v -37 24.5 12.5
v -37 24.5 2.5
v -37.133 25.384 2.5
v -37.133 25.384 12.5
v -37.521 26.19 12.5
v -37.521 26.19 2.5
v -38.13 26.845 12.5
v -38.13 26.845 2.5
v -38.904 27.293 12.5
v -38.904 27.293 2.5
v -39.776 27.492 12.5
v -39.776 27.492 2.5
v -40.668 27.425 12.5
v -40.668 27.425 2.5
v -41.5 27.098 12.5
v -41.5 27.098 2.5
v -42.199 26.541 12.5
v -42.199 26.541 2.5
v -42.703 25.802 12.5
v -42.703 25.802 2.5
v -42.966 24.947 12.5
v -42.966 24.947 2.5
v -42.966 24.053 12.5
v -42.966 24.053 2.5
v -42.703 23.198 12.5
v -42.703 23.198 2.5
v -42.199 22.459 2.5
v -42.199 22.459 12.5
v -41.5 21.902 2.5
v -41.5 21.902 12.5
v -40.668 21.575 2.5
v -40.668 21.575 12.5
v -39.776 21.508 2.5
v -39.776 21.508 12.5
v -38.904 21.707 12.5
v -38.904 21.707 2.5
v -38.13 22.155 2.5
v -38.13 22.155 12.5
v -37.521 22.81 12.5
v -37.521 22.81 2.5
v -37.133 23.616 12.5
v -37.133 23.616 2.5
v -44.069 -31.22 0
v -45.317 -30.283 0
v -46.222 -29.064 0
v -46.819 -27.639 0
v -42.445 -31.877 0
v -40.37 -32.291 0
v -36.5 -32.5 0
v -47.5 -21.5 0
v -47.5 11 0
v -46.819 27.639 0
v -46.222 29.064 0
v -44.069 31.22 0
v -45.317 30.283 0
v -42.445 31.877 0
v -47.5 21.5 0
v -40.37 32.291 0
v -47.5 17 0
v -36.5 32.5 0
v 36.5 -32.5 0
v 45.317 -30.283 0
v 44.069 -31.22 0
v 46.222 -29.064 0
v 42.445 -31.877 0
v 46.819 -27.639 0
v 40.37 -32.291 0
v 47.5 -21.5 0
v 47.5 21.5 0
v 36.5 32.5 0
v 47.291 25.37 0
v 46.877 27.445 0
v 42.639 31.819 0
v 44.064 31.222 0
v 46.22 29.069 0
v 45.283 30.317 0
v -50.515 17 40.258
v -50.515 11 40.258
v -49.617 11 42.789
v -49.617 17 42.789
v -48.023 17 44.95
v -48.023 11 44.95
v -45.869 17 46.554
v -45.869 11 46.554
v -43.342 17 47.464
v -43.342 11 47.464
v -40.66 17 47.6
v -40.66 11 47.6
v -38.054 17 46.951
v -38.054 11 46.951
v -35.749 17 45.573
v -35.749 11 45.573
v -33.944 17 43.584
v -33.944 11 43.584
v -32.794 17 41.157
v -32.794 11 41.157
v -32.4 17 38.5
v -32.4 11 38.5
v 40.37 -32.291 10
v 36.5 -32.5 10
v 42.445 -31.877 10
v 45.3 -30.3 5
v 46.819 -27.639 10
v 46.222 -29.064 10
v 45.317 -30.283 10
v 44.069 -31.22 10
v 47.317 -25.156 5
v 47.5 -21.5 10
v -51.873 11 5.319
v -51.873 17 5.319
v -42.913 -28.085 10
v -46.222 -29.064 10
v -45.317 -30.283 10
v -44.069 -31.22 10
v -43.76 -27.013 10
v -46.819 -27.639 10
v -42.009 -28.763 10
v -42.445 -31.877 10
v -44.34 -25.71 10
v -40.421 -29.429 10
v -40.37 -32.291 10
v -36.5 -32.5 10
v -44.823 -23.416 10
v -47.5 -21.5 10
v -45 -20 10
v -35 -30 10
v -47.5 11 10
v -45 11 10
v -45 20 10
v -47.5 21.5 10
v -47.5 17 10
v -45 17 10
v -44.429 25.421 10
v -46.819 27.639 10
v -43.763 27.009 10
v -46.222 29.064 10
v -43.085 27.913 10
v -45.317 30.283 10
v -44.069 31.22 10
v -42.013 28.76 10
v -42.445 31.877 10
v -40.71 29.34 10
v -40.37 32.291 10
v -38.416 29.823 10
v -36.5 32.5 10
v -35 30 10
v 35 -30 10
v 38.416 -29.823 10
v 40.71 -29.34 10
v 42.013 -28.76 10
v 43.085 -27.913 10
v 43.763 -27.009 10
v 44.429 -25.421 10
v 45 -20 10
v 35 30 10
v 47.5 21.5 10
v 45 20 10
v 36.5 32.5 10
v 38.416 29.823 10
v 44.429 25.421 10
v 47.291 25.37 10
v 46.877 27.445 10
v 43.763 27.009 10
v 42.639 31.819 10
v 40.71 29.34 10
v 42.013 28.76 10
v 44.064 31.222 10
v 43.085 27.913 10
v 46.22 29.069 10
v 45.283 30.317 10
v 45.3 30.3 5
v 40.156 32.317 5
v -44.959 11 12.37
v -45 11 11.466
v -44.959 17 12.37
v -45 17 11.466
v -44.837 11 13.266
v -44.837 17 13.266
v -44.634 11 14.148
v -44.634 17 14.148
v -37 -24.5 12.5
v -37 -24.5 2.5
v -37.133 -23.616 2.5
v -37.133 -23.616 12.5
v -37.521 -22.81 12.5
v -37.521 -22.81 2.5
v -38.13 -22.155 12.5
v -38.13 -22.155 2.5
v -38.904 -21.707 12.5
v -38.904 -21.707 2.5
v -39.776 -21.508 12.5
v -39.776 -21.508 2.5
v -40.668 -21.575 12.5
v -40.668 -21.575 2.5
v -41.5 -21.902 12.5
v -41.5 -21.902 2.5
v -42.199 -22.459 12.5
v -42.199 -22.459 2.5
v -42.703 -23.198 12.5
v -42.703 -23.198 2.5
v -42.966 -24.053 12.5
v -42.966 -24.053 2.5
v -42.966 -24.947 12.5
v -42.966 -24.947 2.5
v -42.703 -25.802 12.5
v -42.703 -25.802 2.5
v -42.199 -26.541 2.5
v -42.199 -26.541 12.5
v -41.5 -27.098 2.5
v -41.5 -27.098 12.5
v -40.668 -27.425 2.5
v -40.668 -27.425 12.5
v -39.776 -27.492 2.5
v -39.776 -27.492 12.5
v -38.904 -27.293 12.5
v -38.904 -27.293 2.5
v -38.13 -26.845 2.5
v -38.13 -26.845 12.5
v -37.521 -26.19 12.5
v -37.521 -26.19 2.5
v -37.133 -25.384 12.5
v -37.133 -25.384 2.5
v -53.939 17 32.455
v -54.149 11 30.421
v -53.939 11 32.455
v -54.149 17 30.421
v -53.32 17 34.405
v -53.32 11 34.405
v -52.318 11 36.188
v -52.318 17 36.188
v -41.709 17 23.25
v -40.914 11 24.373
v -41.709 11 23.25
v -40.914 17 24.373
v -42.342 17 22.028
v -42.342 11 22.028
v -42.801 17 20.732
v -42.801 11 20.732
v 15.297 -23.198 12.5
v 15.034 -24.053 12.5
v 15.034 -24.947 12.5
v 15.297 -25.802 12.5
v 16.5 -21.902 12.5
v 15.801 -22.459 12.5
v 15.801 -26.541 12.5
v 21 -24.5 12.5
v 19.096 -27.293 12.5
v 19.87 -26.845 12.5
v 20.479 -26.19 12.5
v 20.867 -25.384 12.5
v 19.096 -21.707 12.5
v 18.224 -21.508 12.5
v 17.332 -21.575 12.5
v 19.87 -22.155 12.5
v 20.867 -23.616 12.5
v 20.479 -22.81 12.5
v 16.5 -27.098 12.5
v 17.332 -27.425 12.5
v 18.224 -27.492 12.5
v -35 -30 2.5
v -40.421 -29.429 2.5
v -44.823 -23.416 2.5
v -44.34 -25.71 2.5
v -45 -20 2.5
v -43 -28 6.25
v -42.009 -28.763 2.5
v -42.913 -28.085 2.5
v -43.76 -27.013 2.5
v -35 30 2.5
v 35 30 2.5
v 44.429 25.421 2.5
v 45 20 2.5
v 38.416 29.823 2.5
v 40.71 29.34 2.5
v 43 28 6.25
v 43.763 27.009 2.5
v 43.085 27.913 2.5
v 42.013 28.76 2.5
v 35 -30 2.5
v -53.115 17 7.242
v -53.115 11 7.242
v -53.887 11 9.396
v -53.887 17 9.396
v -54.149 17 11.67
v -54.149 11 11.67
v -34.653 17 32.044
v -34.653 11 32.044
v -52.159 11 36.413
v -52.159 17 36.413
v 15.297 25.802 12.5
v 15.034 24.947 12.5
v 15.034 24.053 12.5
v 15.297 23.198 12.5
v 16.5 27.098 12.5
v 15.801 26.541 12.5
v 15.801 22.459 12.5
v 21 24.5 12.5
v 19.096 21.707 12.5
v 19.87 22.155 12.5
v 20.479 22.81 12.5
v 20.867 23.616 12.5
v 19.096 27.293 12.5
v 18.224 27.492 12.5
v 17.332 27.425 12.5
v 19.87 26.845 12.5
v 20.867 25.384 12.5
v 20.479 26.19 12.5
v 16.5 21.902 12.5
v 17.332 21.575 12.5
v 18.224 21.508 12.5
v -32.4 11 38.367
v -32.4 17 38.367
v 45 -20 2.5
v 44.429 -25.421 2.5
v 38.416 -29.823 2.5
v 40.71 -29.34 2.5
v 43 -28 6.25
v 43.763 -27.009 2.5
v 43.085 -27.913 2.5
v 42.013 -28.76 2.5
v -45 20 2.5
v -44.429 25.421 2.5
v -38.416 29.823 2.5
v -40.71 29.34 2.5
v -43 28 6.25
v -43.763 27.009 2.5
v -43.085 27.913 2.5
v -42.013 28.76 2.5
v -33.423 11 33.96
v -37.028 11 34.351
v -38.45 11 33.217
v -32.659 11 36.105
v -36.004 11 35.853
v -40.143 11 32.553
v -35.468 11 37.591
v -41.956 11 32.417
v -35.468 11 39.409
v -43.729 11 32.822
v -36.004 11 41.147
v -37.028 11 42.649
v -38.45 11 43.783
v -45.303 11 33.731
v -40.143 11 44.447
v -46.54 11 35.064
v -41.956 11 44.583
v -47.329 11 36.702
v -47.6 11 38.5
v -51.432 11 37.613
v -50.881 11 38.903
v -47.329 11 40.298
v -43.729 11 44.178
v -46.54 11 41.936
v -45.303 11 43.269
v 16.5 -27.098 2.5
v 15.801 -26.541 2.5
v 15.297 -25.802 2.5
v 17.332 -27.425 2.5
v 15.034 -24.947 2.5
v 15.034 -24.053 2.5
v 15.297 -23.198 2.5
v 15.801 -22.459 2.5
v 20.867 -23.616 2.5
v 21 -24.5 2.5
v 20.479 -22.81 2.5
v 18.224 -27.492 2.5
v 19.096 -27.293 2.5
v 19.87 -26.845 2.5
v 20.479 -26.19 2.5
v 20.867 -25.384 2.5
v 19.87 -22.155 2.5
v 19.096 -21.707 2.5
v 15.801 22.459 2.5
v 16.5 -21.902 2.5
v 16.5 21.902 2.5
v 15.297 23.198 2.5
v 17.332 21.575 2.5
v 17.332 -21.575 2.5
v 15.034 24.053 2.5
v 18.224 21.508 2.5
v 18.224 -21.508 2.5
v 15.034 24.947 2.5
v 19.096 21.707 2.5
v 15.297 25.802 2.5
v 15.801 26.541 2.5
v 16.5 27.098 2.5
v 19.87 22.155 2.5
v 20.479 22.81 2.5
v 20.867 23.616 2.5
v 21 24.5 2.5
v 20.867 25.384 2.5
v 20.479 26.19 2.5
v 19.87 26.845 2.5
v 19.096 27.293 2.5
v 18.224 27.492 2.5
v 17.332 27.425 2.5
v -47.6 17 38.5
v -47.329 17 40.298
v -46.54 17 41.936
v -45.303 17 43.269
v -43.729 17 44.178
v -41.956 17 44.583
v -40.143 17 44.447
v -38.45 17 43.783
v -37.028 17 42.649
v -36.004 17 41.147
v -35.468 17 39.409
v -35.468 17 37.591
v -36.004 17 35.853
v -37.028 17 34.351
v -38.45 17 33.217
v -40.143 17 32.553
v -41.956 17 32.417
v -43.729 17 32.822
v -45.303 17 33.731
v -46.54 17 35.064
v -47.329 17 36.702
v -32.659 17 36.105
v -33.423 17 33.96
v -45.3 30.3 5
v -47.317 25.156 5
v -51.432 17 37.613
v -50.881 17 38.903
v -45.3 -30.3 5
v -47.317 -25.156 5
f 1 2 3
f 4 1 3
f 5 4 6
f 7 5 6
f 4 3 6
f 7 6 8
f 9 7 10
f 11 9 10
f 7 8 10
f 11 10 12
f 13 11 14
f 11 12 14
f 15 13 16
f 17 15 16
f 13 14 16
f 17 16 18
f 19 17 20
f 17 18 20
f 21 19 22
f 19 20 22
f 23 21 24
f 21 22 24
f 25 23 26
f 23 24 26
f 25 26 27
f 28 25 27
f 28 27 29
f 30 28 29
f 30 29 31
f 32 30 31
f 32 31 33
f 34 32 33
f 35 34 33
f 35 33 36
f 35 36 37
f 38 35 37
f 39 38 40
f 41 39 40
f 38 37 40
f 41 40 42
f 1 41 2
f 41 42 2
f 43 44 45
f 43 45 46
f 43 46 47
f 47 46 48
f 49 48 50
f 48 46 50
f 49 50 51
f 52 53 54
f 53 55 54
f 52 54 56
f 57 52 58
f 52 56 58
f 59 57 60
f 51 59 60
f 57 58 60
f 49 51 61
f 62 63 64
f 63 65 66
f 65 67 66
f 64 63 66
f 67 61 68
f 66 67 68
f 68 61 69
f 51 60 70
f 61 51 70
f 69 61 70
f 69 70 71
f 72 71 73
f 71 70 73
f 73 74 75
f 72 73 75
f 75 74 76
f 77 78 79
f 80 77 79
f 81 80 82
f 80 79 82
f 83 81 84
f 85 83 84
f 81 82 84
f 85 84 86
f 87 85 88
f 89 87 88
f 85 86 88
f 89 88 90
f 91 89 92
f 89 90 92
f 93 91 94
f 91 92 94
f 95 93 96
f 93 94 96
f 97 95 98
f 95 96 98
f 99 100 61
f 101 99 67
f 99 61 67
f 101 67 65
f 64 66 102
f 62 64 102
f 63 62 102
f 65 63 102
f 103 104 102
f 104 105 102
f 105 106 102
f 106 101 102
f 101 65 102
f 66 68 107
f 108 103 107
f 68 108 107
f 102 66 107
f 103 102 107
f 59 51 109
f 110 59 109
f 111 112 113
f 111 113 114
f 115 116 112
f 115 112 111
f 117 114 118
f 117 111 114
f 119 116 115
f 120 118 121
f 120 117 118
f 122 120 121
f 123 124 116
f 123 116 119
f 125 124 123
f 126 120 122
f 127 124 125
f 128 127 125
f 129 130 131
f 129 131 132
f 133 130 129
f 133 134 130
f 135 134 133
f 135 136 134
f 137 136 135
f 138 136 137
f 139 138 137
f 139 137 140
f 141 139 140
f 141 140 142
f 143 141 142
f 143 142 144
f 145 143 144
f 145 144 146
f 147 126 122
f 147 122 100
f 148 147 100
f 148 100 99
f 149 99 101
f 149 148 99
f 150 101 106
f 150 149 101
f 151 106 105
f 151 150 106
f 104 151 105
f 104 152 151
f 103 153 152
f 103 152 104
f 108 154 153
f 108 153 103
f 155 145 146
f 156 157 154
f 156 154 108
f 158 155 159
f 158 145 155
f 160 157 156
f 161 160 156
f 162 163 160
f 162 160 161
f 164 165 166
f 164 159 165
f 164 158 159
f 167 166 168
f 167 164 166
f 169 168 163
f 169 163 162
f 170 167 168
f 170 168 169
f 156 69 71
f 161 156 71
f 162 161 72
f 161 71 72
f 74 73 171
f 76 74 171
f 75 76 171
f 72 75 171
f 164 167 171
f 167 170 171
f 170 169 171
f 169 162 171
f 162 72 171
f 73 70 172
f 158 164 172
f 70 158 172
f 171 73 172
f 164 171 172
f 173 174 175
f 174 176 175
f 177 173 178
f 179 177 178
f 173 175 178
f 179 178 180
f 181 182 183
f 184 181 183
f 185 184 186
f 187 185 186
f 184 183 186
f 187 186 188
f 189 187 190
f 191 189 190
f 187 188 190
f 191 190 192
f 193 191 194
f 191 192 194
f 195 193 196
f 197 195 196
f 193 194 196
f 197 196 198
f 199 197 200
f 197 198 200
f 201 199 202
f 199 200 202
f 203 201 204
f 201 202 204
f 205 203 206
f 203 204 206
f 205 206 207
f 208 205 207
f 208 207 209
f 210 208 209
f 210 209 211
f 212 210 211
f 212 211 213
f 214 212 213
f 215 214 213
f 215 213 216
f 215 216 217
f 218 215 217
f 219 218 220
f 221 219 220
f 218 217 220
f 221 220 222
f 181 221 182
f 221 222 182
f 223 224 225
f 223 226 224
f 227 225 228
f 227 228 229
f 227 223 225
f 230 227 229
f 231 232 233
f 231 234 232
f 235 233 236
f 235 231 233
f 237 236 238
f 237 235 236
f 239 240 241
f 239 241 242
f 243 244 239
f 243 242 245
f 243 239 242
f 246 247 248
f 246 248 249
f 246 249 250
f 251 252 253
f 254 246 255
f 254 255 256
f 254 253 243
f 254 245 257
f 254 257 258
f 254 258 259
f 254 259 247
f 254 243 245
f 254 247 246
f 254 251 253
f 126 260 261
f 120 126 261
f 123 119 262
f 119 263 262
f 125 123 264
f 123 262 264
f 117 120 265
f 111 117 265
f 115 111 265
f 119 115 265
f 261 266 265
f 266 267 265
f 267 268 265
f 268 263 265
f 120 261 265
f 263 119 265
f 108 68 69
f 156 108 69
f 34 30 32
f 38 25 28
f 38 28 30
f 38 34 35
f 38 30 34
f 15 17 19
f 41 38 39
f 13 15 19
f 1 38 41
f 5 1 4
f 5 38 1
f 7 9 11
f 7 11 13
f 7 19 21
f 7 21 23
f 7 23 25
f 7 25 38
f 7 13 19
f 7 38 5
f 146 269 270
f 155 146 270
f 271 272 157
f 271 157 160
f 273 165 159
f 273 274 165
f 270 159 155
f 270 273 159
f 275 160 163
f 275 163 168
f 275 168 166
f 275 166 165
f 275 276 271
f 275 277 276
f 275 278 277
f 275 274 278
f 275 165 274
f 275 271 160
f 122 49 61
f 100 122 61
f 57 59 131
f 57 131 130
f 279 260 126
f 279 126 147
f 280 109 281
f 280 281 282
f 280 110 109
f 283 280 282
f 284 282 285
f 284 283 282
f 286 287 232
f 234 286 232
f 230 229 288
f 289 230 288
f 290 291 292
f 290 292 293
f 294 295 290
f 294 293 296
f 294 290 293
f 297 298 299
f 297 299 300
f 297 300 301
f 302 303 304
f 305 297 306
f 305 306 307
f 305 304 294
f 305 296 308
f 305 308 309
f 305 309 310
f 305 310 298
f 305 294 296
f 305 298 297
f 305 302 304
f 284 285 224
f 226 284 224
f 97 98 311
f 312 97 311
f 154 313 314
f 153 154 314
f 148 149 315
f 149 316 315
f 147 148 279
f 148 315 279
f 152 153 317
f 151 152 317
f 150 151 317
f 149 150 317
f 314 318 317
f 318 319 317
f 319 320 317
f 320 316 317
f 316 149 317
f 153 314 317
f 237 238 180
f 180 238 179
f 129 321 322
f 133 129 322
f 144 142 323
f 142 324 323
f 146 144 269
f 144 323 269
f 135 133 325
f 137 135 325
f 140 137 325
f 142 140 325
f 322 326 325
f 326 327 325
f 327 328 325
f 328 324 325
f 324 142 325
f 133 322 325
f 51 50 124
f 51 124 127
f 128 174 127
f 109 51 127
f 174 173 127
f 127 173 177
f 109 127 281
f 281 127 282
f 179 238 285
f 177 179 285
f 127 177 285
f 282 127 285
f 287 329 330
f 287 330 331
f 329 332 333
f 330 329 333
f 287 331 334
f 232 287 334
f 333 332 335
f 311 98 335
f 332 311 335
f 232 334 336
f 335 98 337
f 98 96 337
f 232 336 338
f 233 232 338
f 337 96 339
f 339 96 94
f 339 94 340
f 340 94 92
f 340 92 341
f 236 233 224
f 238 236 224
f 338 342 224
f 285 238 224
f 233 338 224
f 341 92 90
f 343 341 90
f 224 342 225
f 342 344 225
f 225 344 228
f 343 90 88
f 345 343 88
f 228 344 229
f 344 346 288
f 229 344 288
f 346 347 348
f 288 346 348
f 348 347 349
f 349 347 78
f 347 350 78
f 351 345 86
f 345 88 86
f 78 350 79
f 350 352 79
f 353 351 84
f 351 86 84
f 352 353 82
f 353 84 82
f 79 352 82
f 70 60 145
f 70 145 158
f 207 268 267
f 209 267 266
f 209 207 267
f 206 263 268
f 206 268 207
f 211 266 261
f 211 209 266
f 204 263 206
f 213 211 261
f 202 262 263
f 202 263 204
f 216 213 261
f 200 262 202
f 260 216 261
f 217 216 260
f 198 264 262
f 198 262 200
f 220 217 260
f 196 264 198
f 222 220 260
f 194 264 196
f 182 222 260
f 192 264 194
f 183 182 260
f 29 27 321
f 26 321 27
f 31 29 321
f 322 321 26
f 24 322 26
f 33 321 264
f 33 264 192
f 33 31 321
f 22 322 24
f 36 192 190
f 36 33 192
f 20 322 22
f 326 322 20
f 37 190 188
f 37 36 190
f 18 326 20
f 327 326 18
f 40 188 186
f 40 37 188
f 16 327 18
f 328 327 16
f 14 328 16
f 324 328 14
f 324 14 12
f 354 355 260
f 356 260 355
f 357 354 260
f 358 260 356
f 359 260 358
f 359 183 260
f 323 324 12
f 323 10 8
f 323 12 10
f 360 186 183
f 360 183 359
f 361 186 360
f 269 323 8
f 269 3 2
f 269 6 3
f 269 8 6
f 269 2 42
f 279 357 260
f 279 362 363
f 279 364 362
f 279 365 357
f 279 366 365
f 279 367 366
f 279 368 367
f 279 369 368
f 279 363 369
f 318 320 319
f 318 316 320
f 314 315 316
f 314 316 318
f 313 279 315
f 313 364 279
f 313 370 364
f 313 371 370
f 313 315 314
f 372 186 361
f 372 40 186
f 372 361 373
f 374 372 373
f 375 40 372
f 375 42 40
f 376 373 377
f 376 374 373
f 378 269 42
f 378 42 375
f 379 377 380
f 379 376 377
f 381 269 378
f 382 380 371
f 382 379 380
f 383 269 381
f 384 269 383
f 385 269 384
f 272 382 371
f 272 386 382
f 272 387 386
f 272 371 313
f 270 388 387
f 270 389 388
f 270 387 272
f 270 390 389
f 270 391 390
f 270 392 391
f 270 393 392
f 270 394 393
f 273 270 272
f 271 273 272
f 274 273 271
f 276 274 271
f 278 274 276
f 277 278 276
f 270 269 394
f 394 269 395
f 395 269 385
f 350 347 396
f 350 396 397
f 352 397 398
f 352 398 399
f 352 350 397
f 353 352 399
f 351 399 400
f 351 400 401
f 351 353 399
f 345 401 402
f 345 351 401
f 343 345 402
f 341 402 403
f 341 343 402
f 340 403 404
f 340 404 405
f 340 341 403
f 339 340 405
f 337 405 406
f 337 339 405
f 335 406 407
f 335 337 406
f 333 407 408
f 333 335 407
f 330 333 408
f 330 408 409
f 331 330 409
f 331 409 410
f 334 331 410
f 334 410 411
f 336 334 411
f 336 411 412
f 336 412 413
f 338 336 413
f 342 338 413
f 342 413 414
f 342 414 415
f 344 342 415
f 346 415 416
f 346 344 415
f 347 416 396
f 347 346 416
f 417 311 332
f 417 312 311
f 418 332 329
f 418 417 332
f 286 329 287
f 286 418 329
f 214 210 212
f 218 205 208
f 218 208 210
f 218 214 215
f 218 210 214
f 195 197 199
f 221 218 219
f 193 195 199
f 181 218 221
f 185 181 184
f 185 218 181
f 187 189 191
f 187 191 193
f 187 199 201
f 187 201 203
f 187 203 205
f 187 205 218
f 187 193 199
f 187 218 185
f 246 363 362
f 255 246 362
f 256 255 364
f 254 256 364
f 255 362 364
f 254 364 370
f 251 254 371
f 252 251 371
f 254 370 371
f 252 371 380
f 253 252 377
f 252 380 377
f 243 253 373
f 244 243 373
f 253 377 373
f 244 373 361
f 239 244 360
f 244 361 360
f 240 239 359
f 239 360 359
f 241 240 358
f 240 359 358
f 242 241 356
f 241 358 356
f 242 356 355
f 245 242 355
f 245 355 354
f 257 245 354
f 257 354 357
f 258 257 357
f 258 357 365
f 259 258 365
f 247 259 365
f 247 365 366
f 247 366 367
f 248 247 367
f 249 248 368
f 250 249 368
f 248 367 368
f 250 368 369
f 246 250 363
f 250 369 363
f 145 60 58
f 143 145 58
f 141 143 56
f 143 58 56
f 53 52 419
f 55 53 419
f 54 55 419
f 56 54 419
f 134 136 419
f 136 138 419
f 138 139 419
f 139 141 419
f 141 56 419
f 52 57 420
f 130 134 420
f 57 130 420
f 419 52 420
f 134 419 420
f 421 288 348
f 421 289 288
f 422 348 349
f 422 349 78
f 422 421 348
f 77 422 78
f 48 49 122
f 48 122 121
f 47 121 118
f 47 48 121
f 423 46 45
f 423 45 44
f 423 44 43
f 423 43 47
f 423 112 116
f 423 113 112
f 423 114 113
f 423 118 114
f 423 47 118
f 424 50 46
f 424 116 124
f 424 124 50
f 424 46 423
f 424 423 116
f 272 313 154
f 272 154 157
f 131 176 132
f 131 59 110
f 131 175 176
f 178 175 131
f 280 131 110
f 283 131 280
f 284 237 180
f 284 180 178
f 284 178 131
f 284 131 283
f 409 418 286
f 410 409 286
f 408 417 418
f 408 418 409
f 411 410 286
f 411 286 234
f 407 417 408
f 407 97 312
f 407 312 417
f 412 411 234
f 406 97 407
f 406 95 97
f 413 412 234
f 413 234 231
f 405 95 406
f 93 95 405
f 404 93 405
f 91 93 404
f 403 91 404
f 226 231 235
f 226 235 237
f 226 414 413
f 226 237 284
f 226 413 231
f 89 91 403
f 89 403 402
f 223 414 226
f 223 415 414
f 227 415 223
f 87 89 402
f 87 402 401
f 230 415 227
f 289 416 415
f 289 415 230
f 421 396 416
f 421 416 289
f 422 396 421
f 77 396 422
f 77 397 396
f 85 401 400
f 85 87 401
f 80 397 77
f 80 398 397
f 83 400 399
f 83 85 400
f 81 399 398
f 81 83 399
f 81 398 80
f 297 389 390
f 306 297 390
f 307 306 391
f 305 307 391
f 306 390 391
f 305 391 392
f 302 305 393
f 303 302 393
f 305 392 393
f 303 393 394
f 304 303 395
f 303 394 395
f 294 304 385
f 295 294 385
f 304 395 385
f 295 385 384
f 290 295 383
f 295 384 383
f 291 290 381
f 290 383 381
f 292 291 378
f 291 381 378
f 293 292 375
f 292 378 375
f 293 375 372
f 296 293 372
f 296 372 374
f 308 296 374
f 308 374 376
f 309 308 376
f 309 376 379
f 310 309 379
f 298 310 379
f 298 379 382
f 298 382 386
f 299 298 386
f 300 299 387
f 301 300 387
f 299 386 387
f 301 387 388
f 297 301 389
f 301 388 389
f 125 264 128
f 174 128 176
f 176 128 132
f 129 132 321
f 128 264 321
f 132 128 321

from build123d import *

# Parameters (mm, degrees)
F0_W        = 90
F0_H        = 60
F1_DEPTH    = 2.5
F2_W        = 95
F2_H        = 65
F2_W_2      = 90
F2_H_2      = 60
F3_DEPTH    = 10
F4_T1_DEPTH = 7.5
F5_T1_DEPTH = 65
F6_R        = 3
F7_DEPTH    = 10
F10_R       = 6.1
F11_DEPTH   = 6
F12_R       = 10


# Not quite as in the source:
# - a fillet or chamfer that OpenCascade refuses, or shapes differently, is made with other operations: its cross-section is extruded or revolved along the edge and cut away or added


with BuildPart() as f1:
    # F0 (on Top) → F1 (new body)
    with BuildSketch(Plane.XY):
        Rectangle(F0_W, F0_H)
    extrude(amount=F1_DEPTH)

    # F2 (on Top) → F3 (join)
    with BuildSketch(Plane.XY):
        Rectangle(F2_W, F2_H)
        Rectangle(F2_W_2, F2_H_2, mode=Mode.SUBTRACT)
    extrude(amount=F3_DEPTH)

    # F4: fillet of radius 10 on 4 edges, made by hand

    # F4_s2 → F4_t1 (join)
    with BuildSketch(Plane.XY.offset(2.5)):
        with BuildLine():
            add(Edge.make_bspline(
                [(-45, 20), (-45, 30), (-35, 30)],
                knots=[0, 0, 0, 1, 1, 1], degree=2, weights=[1, 1.5, 1]))
            Line((-35, 30), (-45, 30))
            Line((-45, 30), (-45, 20))
        make_face()
        with BuildLine():
            add(Edge.make_bspline(
                [(45, 20), (45, 30), (35, 30)],
                knots=[0, 0, 0, 1, 1, 1], degree=2, weights=[1, 1.5, 1]))
            Line((35, 30), (45, 30))
            Line((45, 30), (45, 20))
        make_face()
        with BuildLine():
            add(Edge.make_bspline(
                [(45, -20), (45, -30), (35, -30)],
                knots=[0, 0, 0, 1, 1, 1], degree=2, weights=[1, 1.5, 1]))
            Line((35, -30), (45, -30))
            Line((45, -30), (45, -20))
        make_face()
        with BuildLine():
            add(Edge.make_bspline(
                [(-35, -30), (-45, -30), (-45, -20)],
                knots=[0, 0, 0, 1, 1, 1], degree=2, weights=[1, 1.5, 1]))
            Line((-45, -20), (-45, -30))
            Line((-45, -30), (-35, -30))
        make_face()
    extrude(amount=F4_T1_DEPTH)

    # F5: fillet of radius 11 on 4 edges, made by hand

    # F5_s2 → F5_t1 (cut)
    with BuildSketch(Plane.XY.offset(-27.5)):
        with BuildLine():
            add(Edge.make_bspline(
                [(-36.5, 32.5), (-47.5, 32.5), (-47.5, 21.5)],
                knots=[0, 0, 0, 1, 1, 1], degree=2, weights=[1, 1.5, 1]))
            Line((-47.5, 21.5), (-47.5, 32.5))
            Line((-47.5, 32.5), (-36.5, 32.5))
        make_face()
        with BuildLine():
            add(Edge.make_bspline(
                [(-36.5, -32.5), (-47.5, -32.5), (-47.5, -21.5)],
                knots=[0, 0, 0, 1, 1, 1], degree=2, weights=[1, 1.5, 1]))
            Line((-47.5, -21.5), (-47.5, -32.5))
            Line((-47.5, -32.5), (-36.5, -32.5))
        make_face()
        with BuildLine():
            add(Edge.make_bspline(
                [(47.5, 21.5), (47.5, 32.5), (36.5, 32.5)],
                knots=[0, 0, 0, 1, 1, 1], degree=2, weights=[1, 1.5, 1]))
            Line((36.5, 32.5), (47.5, 32.5))
            Line((47.5, 32.5), (47.5, 21.5))
        make_face()
        with BuildLine():
            add(Edge.make_bspline(
                [(36.5, -32.5), (47.5, -32.5), (47.5, -21.5)],
                knots=[0, 0, 0, 1, 1, 1], degree=2, weights=[1, 1.5, 1]))
            Line((47.5, -21.5), (47.5, -32.5))
            Line((47.5, -32.5), (36.5, -32.5))
        make_face()
    extrude(amount=F5_T1_DEPTH, mode=Mode.SUBTRACT)

    # F6 (on face) → F7 (join)
    with BuildSketch(Plane.XY.offset(2.5)):
        with Locations((-40, 24.5)):
            Circle(F6_R)
        with Locations((-40, -24.5)):
            Circle(F6_R)
        with Locations((18, -24.5)):
            Circle(F6_R)
        with Locations((18, 24.5)):
            Circle(F6_R)
    extrude(amount=F7_DEPTH)

    # F10 (on offset) → F11 (join)
    with BuildSketch(Plane(origin=(0, 11, 0), x_dir=(-1, 0, 0), z_dir=(0, 1, 0))):
        with BuildLine():
            Line((45, 0), (47.5, 0))
            Line((47.5, 0), (54.148522424, 8.0868878322))
            Line((54.148522424, 8.0868878322), (54.148522424, 33.5947699827))
            Line((54.148522424, 33.5947699827), (50.6855217688, 38.5))
            ThreePointArc((50.6855217688, 38.5), (41.5427608844, 47.6427608844), (32.4, 38.5))
            Line((32.4, 38.5), (32.4, 34.8039232194))
            Line((32.4, 34.8039232194), (42.2389033973, 22.7499233782))
            Line((42.2389033973, 22.7499233782), (45, 12.8317605704))
            Line((45, 12.8317605704), (45, 0))
        make_face()
        with Locations((41.5, 38.5)):
            Circle(F10_R, mode=Mode.SUBTRACT)
    extrude(amount=F11_DEPTH)

    # F12
    f12_edges = [f1.edges().sort_by_distance(p)[0] for p in [
        (-32.4, 14, 34.803923),
        (-42.238903, 14, 22.749923),
        (-45, 14, 12.831761),
        (-50.685522, 14, 38.5),
        (-54.148522, 14, 33.59477),
        (-54.148522, 14, 8.086888),
    ]]
    fillet(f12_edges, radius=F12_R)


solid = f1.part
